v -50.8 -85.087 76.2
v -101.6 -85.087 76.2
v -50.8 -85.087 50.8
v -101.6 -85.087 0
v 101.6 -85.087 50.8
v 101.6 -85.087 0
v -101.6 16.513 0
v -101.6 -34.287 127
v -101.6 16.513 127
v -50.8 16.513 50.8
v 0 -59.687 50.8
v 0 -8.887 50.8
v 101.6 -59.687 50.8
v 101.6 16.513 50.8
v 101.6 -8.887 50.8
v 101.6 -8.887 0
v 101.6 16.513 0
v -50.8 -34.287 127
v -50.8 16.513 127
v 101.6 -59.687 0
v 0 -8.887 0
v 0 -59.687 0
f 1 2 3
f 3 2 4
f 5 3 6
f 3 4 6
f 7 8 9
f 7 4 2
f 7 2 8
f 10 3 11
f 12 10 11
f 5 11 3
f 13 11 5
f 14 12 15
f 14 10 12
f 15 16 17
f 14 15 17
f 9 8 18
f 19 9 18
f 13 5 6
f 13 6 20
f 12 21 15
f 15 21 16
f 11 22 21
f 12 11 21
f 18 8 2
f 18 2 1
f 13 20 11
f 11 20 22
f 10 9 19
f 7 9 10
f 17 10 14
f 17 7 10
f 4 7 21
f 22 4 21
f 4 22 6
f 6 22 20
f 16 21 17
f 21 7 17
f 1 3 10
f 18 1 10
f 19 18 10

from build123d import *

# Parameters (mm, degrees)
F1_DEPTH = 50.8
F2_W     = 50.8
F2_H     = 101.6
F3_DEPTH = 76.2
F4_SIZE  = 50.8


with BuildPart() as f1:
    # F0 (on Top) → F1 (new body)
    with BuildSketch(Plane.XY):
        Polygon((101.6, 16.512535), (-101.6, 16.512535), (-101.6, -85.087465), (101.6, -85.087465), (101.6, -59.687465), (0, -59.687465), (0, -8.887465), (101.6, -8.887465), align=None)
    extrude(amount=F1_DEPTH)

    # F2 (on face) → F3 (join)
    with BuildSketch(Plane.XY.offset(50.8)):
        with Locations((-76.2, -34.287465)):
            Rectangle(F2_W, F2_H)
    extrude(amount=F3_DEPTH)

    # F4
    f4_edges = [f1.edges().sort_by_distance(p)[0] for p in [
        (-76.2, -85.087465, 127),
    ]]
    chamfer(f4_edges, length=F4_SIZE)


solid = f1.part
